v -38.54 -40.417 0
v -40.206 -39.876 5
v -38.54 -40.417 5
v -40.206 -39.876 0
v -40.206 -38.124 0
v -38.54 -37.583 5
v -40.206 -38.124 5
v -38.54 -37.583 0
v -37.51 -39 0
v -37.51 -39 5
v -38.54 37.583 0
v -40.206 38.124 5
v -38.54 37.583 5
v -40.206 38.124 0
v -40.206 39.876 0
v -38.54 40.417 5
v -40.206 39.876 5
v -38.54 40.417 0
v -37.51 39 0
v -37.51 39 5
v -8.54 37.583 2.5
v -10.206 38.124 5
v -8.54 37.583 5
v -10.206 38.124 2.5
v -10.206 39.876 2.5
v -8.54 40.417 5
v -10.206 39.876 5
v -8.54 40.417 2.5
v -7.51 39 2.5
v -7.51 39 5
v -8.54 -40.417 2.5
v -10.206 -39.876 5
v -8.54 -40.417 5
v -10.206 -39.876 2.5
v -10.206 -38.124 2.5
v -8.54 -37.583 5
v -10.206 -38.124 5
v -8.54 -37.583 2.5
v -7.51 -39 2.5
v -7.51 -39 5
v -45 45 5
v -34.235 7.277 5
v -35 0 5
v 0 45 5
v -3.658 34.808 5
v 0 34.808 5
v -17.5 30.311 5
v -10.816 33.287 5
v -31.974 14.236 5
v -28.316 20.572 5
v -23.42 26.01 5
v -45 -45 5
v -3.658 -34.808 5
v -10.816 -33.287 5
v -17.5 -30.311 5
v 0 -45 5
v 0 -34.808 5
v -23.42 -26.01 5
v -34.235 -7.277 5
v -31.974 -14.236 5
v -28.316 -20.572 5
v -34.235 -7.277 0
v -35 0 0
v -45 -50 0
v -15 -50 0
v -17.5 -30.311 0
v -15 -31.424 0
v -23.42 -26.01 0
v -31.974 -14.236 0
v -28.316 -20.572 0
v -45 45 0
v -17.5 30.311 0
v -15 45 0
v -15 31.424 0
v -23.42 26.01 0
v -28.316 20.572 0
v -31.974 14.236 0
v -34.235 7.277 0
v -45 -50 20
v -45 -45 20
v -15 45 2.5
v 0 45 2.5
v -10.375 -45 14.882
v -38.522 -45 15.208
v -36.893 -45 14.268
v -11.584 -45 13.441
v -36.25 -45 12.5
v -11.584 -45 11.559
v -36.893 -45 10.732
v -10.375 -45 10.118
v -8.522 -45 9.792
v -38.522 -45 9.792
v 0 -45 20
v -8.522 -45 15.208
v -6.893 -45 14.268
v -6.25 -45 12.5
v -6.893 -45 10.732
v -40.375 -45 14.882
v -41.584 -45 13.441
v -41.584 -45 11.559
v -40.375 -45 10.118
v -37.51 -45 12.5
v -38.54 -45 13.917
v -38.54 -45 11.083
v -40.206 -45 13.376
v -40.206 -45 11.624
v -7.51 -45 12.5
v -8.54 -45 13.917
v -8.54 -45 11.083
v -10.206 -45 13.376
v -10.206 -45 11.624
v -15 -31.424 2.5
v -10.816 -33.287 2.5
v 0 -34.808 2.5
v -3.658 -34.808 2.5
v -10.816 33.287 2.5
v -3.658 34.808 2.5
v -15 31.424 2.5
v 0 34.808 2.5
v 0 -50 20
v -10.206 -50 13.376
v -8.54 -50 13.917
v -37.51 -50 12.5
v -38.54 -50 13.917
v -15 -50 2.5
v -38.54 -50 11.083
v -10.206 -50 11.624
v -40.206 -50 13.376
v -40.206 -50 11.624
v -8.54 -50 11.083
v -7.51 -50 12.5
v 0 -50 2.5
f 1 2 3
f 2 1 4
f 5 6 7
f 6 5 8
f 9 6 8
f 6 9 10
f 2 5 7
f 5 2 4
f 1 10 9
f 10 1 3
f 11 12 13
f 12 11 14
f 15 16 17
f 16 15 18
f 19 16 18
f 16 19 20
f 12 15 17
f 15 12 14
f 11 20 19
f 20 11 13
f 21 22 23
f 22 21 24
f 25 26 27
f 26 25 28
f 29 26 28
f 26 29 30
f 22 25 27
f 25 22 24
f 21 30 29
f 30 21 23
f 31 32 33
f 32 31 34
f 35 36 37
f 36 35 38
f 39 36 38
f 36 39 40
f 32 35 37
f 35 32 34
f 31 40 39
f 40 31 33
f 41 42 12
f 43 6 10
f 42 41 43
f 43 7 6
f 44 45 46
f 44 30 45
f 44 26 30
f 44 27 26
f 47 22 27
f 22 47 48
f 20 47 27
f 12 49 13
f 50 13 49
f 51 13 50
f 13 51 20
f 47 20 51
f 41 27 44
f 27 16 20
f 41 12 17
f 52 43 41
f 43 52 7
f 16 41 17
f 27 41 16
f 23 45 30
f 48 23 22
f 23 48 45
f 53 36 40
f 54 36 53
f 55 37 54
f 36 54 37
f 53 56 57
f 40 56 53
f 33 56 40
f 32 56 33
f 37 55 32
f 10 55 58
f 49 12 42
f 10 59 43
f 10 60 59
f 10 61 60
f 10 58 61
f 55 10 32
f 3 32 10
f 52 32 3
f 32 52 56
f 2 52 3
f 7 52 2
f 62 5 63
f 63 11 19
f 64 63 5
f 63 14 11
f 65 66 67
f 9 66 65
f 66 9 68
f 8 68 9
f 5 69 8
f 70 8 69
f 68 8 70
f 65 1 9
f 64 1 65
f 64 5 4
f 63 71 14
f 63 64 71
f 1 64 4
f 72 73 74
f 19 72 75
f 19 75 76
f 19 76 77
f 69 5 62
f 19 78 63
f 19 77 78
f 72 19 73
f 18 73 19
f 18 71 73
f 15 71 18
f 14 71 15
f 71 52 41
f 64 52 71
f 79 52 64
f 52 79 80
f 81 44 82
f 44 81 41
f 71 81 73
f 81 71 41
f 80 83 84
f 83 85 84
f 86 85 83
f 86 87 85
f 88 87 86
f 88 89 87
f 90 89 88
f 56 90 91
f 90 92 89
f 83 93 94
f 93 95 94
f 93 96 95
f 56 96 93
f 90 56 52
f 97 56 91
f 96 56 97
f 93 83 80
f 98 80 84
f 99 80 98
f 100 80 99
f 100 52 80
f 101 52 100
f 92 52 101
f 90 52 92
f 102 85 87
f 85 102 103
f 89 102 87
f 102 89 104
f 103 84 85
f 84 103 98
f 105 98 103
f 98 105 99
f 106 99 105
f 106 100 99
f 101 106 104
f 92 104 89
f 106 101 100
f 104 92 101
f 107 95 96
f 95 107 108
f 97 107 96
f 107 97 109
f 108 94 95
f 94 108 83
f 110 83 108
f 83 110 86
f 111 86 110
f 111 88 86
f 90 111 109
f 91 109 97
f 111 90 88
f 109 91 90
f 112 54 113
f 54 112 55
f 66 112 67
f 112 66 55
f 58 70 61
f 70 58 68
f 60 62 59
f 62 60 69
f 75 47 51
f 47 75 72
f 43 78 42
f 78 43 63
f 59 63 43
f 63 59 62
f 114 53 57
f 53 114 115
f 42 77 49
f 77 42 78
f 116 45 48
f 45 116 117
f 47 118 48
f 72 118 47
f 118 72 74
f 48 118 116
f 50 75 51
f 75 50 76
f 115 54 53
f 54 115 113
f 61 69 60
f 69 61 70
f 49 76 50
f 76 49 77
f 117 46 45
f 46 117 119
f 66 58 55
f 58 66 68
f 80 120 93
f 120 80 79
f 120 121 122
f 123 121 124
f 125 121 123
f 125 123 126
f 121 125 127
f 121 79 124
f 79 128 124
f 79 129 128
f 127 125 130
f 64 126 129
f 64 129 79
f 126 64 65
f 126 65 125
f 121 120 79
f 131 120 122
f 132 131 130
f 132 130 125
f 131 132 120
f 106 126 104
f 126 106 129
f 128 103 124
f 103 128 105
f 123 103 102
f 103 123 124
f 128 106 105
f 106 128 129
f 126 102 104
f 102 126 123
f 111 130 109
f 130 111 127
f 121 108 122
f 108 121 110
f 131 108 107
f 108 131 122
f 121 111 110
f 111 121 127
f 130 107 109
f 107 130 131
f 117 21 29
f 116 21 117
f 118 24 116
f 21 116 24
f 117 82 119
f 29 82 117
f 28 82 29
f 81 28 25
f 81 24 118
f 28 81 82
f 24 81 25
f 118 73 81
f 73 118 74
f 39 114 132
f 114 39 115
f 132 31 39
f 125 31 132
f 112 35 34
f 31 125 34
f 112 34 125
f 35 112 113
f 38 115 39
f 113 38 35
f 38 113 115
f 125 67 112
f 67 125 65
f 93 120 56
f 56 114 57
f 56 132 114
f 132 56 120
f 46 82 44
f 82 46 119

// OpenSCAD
// file: lerdgemount.scad
use <MCAD/nuts_and_bolts.scad>;

module bolt(thesize,thelength)
{
 boltHole(thesize+.2,length=thelength);   
 %boltHole(thesize+.2,length=thelength);   
}
module board()
{
      difference(){
         translate([-45,-45,0]) cube([90,90,5]);  
         translate([-45+6,-45+6,-5]) bolt(3,12);
         translate([ 45-6,-45+6,-5]) bolt(3,12);
         translate([-45+6, 45-6,-5]) bolt(3,12);
         translate([ 45-6, 45-6,-5]) bolt(3,12); 
         translate([0,0,-5]) cylinder(r=35,h=20);      
         translate([-15+6, 45-6,-5]) bolt(3,12);
         translate([ 15-6, 45-6,-5]) bolt(3,12);  
         translate([-15+6, -45+6,-5]) bolt(3,12);
         translate([ 15-6, -45+6,-5]) bolt(3,12);   
         }
}

module mount()
{
    translate([-45,-45-5,0]) cube([90,5,15+5]);
    
}

module themount()
{
  board();
  mount();
}

module assembly()
{
    difference(){
        themount();
        translate([-15, 45-15,0])  cube([30,15,2.5]);
        translate([-15,-45-10,0])  cube([30,15+10,2.5]);
         translate([-45+6, -45, 5+7.5]) rotate([90,0,0])  bolt(3,12);
         translate([ 45-6, -45, 5+7.5]) rotate([90,0,0])  bolt(3,12);  
         translate([-15+6, -45, 5+7.5]) rotate([90,0,0]) bolt(3,12);
         translate([ 15-6, -45, 5+7.5]) rotate([90,0,0]) bolt(3,12);   
        }
}
// main file
use <lerdgemount.scad>;

module part1()
{
    difference(){
      assembly();
      translate([0,-45-6,-.1]) cube([45.1,97,22]); 
      }
}    

part1();
